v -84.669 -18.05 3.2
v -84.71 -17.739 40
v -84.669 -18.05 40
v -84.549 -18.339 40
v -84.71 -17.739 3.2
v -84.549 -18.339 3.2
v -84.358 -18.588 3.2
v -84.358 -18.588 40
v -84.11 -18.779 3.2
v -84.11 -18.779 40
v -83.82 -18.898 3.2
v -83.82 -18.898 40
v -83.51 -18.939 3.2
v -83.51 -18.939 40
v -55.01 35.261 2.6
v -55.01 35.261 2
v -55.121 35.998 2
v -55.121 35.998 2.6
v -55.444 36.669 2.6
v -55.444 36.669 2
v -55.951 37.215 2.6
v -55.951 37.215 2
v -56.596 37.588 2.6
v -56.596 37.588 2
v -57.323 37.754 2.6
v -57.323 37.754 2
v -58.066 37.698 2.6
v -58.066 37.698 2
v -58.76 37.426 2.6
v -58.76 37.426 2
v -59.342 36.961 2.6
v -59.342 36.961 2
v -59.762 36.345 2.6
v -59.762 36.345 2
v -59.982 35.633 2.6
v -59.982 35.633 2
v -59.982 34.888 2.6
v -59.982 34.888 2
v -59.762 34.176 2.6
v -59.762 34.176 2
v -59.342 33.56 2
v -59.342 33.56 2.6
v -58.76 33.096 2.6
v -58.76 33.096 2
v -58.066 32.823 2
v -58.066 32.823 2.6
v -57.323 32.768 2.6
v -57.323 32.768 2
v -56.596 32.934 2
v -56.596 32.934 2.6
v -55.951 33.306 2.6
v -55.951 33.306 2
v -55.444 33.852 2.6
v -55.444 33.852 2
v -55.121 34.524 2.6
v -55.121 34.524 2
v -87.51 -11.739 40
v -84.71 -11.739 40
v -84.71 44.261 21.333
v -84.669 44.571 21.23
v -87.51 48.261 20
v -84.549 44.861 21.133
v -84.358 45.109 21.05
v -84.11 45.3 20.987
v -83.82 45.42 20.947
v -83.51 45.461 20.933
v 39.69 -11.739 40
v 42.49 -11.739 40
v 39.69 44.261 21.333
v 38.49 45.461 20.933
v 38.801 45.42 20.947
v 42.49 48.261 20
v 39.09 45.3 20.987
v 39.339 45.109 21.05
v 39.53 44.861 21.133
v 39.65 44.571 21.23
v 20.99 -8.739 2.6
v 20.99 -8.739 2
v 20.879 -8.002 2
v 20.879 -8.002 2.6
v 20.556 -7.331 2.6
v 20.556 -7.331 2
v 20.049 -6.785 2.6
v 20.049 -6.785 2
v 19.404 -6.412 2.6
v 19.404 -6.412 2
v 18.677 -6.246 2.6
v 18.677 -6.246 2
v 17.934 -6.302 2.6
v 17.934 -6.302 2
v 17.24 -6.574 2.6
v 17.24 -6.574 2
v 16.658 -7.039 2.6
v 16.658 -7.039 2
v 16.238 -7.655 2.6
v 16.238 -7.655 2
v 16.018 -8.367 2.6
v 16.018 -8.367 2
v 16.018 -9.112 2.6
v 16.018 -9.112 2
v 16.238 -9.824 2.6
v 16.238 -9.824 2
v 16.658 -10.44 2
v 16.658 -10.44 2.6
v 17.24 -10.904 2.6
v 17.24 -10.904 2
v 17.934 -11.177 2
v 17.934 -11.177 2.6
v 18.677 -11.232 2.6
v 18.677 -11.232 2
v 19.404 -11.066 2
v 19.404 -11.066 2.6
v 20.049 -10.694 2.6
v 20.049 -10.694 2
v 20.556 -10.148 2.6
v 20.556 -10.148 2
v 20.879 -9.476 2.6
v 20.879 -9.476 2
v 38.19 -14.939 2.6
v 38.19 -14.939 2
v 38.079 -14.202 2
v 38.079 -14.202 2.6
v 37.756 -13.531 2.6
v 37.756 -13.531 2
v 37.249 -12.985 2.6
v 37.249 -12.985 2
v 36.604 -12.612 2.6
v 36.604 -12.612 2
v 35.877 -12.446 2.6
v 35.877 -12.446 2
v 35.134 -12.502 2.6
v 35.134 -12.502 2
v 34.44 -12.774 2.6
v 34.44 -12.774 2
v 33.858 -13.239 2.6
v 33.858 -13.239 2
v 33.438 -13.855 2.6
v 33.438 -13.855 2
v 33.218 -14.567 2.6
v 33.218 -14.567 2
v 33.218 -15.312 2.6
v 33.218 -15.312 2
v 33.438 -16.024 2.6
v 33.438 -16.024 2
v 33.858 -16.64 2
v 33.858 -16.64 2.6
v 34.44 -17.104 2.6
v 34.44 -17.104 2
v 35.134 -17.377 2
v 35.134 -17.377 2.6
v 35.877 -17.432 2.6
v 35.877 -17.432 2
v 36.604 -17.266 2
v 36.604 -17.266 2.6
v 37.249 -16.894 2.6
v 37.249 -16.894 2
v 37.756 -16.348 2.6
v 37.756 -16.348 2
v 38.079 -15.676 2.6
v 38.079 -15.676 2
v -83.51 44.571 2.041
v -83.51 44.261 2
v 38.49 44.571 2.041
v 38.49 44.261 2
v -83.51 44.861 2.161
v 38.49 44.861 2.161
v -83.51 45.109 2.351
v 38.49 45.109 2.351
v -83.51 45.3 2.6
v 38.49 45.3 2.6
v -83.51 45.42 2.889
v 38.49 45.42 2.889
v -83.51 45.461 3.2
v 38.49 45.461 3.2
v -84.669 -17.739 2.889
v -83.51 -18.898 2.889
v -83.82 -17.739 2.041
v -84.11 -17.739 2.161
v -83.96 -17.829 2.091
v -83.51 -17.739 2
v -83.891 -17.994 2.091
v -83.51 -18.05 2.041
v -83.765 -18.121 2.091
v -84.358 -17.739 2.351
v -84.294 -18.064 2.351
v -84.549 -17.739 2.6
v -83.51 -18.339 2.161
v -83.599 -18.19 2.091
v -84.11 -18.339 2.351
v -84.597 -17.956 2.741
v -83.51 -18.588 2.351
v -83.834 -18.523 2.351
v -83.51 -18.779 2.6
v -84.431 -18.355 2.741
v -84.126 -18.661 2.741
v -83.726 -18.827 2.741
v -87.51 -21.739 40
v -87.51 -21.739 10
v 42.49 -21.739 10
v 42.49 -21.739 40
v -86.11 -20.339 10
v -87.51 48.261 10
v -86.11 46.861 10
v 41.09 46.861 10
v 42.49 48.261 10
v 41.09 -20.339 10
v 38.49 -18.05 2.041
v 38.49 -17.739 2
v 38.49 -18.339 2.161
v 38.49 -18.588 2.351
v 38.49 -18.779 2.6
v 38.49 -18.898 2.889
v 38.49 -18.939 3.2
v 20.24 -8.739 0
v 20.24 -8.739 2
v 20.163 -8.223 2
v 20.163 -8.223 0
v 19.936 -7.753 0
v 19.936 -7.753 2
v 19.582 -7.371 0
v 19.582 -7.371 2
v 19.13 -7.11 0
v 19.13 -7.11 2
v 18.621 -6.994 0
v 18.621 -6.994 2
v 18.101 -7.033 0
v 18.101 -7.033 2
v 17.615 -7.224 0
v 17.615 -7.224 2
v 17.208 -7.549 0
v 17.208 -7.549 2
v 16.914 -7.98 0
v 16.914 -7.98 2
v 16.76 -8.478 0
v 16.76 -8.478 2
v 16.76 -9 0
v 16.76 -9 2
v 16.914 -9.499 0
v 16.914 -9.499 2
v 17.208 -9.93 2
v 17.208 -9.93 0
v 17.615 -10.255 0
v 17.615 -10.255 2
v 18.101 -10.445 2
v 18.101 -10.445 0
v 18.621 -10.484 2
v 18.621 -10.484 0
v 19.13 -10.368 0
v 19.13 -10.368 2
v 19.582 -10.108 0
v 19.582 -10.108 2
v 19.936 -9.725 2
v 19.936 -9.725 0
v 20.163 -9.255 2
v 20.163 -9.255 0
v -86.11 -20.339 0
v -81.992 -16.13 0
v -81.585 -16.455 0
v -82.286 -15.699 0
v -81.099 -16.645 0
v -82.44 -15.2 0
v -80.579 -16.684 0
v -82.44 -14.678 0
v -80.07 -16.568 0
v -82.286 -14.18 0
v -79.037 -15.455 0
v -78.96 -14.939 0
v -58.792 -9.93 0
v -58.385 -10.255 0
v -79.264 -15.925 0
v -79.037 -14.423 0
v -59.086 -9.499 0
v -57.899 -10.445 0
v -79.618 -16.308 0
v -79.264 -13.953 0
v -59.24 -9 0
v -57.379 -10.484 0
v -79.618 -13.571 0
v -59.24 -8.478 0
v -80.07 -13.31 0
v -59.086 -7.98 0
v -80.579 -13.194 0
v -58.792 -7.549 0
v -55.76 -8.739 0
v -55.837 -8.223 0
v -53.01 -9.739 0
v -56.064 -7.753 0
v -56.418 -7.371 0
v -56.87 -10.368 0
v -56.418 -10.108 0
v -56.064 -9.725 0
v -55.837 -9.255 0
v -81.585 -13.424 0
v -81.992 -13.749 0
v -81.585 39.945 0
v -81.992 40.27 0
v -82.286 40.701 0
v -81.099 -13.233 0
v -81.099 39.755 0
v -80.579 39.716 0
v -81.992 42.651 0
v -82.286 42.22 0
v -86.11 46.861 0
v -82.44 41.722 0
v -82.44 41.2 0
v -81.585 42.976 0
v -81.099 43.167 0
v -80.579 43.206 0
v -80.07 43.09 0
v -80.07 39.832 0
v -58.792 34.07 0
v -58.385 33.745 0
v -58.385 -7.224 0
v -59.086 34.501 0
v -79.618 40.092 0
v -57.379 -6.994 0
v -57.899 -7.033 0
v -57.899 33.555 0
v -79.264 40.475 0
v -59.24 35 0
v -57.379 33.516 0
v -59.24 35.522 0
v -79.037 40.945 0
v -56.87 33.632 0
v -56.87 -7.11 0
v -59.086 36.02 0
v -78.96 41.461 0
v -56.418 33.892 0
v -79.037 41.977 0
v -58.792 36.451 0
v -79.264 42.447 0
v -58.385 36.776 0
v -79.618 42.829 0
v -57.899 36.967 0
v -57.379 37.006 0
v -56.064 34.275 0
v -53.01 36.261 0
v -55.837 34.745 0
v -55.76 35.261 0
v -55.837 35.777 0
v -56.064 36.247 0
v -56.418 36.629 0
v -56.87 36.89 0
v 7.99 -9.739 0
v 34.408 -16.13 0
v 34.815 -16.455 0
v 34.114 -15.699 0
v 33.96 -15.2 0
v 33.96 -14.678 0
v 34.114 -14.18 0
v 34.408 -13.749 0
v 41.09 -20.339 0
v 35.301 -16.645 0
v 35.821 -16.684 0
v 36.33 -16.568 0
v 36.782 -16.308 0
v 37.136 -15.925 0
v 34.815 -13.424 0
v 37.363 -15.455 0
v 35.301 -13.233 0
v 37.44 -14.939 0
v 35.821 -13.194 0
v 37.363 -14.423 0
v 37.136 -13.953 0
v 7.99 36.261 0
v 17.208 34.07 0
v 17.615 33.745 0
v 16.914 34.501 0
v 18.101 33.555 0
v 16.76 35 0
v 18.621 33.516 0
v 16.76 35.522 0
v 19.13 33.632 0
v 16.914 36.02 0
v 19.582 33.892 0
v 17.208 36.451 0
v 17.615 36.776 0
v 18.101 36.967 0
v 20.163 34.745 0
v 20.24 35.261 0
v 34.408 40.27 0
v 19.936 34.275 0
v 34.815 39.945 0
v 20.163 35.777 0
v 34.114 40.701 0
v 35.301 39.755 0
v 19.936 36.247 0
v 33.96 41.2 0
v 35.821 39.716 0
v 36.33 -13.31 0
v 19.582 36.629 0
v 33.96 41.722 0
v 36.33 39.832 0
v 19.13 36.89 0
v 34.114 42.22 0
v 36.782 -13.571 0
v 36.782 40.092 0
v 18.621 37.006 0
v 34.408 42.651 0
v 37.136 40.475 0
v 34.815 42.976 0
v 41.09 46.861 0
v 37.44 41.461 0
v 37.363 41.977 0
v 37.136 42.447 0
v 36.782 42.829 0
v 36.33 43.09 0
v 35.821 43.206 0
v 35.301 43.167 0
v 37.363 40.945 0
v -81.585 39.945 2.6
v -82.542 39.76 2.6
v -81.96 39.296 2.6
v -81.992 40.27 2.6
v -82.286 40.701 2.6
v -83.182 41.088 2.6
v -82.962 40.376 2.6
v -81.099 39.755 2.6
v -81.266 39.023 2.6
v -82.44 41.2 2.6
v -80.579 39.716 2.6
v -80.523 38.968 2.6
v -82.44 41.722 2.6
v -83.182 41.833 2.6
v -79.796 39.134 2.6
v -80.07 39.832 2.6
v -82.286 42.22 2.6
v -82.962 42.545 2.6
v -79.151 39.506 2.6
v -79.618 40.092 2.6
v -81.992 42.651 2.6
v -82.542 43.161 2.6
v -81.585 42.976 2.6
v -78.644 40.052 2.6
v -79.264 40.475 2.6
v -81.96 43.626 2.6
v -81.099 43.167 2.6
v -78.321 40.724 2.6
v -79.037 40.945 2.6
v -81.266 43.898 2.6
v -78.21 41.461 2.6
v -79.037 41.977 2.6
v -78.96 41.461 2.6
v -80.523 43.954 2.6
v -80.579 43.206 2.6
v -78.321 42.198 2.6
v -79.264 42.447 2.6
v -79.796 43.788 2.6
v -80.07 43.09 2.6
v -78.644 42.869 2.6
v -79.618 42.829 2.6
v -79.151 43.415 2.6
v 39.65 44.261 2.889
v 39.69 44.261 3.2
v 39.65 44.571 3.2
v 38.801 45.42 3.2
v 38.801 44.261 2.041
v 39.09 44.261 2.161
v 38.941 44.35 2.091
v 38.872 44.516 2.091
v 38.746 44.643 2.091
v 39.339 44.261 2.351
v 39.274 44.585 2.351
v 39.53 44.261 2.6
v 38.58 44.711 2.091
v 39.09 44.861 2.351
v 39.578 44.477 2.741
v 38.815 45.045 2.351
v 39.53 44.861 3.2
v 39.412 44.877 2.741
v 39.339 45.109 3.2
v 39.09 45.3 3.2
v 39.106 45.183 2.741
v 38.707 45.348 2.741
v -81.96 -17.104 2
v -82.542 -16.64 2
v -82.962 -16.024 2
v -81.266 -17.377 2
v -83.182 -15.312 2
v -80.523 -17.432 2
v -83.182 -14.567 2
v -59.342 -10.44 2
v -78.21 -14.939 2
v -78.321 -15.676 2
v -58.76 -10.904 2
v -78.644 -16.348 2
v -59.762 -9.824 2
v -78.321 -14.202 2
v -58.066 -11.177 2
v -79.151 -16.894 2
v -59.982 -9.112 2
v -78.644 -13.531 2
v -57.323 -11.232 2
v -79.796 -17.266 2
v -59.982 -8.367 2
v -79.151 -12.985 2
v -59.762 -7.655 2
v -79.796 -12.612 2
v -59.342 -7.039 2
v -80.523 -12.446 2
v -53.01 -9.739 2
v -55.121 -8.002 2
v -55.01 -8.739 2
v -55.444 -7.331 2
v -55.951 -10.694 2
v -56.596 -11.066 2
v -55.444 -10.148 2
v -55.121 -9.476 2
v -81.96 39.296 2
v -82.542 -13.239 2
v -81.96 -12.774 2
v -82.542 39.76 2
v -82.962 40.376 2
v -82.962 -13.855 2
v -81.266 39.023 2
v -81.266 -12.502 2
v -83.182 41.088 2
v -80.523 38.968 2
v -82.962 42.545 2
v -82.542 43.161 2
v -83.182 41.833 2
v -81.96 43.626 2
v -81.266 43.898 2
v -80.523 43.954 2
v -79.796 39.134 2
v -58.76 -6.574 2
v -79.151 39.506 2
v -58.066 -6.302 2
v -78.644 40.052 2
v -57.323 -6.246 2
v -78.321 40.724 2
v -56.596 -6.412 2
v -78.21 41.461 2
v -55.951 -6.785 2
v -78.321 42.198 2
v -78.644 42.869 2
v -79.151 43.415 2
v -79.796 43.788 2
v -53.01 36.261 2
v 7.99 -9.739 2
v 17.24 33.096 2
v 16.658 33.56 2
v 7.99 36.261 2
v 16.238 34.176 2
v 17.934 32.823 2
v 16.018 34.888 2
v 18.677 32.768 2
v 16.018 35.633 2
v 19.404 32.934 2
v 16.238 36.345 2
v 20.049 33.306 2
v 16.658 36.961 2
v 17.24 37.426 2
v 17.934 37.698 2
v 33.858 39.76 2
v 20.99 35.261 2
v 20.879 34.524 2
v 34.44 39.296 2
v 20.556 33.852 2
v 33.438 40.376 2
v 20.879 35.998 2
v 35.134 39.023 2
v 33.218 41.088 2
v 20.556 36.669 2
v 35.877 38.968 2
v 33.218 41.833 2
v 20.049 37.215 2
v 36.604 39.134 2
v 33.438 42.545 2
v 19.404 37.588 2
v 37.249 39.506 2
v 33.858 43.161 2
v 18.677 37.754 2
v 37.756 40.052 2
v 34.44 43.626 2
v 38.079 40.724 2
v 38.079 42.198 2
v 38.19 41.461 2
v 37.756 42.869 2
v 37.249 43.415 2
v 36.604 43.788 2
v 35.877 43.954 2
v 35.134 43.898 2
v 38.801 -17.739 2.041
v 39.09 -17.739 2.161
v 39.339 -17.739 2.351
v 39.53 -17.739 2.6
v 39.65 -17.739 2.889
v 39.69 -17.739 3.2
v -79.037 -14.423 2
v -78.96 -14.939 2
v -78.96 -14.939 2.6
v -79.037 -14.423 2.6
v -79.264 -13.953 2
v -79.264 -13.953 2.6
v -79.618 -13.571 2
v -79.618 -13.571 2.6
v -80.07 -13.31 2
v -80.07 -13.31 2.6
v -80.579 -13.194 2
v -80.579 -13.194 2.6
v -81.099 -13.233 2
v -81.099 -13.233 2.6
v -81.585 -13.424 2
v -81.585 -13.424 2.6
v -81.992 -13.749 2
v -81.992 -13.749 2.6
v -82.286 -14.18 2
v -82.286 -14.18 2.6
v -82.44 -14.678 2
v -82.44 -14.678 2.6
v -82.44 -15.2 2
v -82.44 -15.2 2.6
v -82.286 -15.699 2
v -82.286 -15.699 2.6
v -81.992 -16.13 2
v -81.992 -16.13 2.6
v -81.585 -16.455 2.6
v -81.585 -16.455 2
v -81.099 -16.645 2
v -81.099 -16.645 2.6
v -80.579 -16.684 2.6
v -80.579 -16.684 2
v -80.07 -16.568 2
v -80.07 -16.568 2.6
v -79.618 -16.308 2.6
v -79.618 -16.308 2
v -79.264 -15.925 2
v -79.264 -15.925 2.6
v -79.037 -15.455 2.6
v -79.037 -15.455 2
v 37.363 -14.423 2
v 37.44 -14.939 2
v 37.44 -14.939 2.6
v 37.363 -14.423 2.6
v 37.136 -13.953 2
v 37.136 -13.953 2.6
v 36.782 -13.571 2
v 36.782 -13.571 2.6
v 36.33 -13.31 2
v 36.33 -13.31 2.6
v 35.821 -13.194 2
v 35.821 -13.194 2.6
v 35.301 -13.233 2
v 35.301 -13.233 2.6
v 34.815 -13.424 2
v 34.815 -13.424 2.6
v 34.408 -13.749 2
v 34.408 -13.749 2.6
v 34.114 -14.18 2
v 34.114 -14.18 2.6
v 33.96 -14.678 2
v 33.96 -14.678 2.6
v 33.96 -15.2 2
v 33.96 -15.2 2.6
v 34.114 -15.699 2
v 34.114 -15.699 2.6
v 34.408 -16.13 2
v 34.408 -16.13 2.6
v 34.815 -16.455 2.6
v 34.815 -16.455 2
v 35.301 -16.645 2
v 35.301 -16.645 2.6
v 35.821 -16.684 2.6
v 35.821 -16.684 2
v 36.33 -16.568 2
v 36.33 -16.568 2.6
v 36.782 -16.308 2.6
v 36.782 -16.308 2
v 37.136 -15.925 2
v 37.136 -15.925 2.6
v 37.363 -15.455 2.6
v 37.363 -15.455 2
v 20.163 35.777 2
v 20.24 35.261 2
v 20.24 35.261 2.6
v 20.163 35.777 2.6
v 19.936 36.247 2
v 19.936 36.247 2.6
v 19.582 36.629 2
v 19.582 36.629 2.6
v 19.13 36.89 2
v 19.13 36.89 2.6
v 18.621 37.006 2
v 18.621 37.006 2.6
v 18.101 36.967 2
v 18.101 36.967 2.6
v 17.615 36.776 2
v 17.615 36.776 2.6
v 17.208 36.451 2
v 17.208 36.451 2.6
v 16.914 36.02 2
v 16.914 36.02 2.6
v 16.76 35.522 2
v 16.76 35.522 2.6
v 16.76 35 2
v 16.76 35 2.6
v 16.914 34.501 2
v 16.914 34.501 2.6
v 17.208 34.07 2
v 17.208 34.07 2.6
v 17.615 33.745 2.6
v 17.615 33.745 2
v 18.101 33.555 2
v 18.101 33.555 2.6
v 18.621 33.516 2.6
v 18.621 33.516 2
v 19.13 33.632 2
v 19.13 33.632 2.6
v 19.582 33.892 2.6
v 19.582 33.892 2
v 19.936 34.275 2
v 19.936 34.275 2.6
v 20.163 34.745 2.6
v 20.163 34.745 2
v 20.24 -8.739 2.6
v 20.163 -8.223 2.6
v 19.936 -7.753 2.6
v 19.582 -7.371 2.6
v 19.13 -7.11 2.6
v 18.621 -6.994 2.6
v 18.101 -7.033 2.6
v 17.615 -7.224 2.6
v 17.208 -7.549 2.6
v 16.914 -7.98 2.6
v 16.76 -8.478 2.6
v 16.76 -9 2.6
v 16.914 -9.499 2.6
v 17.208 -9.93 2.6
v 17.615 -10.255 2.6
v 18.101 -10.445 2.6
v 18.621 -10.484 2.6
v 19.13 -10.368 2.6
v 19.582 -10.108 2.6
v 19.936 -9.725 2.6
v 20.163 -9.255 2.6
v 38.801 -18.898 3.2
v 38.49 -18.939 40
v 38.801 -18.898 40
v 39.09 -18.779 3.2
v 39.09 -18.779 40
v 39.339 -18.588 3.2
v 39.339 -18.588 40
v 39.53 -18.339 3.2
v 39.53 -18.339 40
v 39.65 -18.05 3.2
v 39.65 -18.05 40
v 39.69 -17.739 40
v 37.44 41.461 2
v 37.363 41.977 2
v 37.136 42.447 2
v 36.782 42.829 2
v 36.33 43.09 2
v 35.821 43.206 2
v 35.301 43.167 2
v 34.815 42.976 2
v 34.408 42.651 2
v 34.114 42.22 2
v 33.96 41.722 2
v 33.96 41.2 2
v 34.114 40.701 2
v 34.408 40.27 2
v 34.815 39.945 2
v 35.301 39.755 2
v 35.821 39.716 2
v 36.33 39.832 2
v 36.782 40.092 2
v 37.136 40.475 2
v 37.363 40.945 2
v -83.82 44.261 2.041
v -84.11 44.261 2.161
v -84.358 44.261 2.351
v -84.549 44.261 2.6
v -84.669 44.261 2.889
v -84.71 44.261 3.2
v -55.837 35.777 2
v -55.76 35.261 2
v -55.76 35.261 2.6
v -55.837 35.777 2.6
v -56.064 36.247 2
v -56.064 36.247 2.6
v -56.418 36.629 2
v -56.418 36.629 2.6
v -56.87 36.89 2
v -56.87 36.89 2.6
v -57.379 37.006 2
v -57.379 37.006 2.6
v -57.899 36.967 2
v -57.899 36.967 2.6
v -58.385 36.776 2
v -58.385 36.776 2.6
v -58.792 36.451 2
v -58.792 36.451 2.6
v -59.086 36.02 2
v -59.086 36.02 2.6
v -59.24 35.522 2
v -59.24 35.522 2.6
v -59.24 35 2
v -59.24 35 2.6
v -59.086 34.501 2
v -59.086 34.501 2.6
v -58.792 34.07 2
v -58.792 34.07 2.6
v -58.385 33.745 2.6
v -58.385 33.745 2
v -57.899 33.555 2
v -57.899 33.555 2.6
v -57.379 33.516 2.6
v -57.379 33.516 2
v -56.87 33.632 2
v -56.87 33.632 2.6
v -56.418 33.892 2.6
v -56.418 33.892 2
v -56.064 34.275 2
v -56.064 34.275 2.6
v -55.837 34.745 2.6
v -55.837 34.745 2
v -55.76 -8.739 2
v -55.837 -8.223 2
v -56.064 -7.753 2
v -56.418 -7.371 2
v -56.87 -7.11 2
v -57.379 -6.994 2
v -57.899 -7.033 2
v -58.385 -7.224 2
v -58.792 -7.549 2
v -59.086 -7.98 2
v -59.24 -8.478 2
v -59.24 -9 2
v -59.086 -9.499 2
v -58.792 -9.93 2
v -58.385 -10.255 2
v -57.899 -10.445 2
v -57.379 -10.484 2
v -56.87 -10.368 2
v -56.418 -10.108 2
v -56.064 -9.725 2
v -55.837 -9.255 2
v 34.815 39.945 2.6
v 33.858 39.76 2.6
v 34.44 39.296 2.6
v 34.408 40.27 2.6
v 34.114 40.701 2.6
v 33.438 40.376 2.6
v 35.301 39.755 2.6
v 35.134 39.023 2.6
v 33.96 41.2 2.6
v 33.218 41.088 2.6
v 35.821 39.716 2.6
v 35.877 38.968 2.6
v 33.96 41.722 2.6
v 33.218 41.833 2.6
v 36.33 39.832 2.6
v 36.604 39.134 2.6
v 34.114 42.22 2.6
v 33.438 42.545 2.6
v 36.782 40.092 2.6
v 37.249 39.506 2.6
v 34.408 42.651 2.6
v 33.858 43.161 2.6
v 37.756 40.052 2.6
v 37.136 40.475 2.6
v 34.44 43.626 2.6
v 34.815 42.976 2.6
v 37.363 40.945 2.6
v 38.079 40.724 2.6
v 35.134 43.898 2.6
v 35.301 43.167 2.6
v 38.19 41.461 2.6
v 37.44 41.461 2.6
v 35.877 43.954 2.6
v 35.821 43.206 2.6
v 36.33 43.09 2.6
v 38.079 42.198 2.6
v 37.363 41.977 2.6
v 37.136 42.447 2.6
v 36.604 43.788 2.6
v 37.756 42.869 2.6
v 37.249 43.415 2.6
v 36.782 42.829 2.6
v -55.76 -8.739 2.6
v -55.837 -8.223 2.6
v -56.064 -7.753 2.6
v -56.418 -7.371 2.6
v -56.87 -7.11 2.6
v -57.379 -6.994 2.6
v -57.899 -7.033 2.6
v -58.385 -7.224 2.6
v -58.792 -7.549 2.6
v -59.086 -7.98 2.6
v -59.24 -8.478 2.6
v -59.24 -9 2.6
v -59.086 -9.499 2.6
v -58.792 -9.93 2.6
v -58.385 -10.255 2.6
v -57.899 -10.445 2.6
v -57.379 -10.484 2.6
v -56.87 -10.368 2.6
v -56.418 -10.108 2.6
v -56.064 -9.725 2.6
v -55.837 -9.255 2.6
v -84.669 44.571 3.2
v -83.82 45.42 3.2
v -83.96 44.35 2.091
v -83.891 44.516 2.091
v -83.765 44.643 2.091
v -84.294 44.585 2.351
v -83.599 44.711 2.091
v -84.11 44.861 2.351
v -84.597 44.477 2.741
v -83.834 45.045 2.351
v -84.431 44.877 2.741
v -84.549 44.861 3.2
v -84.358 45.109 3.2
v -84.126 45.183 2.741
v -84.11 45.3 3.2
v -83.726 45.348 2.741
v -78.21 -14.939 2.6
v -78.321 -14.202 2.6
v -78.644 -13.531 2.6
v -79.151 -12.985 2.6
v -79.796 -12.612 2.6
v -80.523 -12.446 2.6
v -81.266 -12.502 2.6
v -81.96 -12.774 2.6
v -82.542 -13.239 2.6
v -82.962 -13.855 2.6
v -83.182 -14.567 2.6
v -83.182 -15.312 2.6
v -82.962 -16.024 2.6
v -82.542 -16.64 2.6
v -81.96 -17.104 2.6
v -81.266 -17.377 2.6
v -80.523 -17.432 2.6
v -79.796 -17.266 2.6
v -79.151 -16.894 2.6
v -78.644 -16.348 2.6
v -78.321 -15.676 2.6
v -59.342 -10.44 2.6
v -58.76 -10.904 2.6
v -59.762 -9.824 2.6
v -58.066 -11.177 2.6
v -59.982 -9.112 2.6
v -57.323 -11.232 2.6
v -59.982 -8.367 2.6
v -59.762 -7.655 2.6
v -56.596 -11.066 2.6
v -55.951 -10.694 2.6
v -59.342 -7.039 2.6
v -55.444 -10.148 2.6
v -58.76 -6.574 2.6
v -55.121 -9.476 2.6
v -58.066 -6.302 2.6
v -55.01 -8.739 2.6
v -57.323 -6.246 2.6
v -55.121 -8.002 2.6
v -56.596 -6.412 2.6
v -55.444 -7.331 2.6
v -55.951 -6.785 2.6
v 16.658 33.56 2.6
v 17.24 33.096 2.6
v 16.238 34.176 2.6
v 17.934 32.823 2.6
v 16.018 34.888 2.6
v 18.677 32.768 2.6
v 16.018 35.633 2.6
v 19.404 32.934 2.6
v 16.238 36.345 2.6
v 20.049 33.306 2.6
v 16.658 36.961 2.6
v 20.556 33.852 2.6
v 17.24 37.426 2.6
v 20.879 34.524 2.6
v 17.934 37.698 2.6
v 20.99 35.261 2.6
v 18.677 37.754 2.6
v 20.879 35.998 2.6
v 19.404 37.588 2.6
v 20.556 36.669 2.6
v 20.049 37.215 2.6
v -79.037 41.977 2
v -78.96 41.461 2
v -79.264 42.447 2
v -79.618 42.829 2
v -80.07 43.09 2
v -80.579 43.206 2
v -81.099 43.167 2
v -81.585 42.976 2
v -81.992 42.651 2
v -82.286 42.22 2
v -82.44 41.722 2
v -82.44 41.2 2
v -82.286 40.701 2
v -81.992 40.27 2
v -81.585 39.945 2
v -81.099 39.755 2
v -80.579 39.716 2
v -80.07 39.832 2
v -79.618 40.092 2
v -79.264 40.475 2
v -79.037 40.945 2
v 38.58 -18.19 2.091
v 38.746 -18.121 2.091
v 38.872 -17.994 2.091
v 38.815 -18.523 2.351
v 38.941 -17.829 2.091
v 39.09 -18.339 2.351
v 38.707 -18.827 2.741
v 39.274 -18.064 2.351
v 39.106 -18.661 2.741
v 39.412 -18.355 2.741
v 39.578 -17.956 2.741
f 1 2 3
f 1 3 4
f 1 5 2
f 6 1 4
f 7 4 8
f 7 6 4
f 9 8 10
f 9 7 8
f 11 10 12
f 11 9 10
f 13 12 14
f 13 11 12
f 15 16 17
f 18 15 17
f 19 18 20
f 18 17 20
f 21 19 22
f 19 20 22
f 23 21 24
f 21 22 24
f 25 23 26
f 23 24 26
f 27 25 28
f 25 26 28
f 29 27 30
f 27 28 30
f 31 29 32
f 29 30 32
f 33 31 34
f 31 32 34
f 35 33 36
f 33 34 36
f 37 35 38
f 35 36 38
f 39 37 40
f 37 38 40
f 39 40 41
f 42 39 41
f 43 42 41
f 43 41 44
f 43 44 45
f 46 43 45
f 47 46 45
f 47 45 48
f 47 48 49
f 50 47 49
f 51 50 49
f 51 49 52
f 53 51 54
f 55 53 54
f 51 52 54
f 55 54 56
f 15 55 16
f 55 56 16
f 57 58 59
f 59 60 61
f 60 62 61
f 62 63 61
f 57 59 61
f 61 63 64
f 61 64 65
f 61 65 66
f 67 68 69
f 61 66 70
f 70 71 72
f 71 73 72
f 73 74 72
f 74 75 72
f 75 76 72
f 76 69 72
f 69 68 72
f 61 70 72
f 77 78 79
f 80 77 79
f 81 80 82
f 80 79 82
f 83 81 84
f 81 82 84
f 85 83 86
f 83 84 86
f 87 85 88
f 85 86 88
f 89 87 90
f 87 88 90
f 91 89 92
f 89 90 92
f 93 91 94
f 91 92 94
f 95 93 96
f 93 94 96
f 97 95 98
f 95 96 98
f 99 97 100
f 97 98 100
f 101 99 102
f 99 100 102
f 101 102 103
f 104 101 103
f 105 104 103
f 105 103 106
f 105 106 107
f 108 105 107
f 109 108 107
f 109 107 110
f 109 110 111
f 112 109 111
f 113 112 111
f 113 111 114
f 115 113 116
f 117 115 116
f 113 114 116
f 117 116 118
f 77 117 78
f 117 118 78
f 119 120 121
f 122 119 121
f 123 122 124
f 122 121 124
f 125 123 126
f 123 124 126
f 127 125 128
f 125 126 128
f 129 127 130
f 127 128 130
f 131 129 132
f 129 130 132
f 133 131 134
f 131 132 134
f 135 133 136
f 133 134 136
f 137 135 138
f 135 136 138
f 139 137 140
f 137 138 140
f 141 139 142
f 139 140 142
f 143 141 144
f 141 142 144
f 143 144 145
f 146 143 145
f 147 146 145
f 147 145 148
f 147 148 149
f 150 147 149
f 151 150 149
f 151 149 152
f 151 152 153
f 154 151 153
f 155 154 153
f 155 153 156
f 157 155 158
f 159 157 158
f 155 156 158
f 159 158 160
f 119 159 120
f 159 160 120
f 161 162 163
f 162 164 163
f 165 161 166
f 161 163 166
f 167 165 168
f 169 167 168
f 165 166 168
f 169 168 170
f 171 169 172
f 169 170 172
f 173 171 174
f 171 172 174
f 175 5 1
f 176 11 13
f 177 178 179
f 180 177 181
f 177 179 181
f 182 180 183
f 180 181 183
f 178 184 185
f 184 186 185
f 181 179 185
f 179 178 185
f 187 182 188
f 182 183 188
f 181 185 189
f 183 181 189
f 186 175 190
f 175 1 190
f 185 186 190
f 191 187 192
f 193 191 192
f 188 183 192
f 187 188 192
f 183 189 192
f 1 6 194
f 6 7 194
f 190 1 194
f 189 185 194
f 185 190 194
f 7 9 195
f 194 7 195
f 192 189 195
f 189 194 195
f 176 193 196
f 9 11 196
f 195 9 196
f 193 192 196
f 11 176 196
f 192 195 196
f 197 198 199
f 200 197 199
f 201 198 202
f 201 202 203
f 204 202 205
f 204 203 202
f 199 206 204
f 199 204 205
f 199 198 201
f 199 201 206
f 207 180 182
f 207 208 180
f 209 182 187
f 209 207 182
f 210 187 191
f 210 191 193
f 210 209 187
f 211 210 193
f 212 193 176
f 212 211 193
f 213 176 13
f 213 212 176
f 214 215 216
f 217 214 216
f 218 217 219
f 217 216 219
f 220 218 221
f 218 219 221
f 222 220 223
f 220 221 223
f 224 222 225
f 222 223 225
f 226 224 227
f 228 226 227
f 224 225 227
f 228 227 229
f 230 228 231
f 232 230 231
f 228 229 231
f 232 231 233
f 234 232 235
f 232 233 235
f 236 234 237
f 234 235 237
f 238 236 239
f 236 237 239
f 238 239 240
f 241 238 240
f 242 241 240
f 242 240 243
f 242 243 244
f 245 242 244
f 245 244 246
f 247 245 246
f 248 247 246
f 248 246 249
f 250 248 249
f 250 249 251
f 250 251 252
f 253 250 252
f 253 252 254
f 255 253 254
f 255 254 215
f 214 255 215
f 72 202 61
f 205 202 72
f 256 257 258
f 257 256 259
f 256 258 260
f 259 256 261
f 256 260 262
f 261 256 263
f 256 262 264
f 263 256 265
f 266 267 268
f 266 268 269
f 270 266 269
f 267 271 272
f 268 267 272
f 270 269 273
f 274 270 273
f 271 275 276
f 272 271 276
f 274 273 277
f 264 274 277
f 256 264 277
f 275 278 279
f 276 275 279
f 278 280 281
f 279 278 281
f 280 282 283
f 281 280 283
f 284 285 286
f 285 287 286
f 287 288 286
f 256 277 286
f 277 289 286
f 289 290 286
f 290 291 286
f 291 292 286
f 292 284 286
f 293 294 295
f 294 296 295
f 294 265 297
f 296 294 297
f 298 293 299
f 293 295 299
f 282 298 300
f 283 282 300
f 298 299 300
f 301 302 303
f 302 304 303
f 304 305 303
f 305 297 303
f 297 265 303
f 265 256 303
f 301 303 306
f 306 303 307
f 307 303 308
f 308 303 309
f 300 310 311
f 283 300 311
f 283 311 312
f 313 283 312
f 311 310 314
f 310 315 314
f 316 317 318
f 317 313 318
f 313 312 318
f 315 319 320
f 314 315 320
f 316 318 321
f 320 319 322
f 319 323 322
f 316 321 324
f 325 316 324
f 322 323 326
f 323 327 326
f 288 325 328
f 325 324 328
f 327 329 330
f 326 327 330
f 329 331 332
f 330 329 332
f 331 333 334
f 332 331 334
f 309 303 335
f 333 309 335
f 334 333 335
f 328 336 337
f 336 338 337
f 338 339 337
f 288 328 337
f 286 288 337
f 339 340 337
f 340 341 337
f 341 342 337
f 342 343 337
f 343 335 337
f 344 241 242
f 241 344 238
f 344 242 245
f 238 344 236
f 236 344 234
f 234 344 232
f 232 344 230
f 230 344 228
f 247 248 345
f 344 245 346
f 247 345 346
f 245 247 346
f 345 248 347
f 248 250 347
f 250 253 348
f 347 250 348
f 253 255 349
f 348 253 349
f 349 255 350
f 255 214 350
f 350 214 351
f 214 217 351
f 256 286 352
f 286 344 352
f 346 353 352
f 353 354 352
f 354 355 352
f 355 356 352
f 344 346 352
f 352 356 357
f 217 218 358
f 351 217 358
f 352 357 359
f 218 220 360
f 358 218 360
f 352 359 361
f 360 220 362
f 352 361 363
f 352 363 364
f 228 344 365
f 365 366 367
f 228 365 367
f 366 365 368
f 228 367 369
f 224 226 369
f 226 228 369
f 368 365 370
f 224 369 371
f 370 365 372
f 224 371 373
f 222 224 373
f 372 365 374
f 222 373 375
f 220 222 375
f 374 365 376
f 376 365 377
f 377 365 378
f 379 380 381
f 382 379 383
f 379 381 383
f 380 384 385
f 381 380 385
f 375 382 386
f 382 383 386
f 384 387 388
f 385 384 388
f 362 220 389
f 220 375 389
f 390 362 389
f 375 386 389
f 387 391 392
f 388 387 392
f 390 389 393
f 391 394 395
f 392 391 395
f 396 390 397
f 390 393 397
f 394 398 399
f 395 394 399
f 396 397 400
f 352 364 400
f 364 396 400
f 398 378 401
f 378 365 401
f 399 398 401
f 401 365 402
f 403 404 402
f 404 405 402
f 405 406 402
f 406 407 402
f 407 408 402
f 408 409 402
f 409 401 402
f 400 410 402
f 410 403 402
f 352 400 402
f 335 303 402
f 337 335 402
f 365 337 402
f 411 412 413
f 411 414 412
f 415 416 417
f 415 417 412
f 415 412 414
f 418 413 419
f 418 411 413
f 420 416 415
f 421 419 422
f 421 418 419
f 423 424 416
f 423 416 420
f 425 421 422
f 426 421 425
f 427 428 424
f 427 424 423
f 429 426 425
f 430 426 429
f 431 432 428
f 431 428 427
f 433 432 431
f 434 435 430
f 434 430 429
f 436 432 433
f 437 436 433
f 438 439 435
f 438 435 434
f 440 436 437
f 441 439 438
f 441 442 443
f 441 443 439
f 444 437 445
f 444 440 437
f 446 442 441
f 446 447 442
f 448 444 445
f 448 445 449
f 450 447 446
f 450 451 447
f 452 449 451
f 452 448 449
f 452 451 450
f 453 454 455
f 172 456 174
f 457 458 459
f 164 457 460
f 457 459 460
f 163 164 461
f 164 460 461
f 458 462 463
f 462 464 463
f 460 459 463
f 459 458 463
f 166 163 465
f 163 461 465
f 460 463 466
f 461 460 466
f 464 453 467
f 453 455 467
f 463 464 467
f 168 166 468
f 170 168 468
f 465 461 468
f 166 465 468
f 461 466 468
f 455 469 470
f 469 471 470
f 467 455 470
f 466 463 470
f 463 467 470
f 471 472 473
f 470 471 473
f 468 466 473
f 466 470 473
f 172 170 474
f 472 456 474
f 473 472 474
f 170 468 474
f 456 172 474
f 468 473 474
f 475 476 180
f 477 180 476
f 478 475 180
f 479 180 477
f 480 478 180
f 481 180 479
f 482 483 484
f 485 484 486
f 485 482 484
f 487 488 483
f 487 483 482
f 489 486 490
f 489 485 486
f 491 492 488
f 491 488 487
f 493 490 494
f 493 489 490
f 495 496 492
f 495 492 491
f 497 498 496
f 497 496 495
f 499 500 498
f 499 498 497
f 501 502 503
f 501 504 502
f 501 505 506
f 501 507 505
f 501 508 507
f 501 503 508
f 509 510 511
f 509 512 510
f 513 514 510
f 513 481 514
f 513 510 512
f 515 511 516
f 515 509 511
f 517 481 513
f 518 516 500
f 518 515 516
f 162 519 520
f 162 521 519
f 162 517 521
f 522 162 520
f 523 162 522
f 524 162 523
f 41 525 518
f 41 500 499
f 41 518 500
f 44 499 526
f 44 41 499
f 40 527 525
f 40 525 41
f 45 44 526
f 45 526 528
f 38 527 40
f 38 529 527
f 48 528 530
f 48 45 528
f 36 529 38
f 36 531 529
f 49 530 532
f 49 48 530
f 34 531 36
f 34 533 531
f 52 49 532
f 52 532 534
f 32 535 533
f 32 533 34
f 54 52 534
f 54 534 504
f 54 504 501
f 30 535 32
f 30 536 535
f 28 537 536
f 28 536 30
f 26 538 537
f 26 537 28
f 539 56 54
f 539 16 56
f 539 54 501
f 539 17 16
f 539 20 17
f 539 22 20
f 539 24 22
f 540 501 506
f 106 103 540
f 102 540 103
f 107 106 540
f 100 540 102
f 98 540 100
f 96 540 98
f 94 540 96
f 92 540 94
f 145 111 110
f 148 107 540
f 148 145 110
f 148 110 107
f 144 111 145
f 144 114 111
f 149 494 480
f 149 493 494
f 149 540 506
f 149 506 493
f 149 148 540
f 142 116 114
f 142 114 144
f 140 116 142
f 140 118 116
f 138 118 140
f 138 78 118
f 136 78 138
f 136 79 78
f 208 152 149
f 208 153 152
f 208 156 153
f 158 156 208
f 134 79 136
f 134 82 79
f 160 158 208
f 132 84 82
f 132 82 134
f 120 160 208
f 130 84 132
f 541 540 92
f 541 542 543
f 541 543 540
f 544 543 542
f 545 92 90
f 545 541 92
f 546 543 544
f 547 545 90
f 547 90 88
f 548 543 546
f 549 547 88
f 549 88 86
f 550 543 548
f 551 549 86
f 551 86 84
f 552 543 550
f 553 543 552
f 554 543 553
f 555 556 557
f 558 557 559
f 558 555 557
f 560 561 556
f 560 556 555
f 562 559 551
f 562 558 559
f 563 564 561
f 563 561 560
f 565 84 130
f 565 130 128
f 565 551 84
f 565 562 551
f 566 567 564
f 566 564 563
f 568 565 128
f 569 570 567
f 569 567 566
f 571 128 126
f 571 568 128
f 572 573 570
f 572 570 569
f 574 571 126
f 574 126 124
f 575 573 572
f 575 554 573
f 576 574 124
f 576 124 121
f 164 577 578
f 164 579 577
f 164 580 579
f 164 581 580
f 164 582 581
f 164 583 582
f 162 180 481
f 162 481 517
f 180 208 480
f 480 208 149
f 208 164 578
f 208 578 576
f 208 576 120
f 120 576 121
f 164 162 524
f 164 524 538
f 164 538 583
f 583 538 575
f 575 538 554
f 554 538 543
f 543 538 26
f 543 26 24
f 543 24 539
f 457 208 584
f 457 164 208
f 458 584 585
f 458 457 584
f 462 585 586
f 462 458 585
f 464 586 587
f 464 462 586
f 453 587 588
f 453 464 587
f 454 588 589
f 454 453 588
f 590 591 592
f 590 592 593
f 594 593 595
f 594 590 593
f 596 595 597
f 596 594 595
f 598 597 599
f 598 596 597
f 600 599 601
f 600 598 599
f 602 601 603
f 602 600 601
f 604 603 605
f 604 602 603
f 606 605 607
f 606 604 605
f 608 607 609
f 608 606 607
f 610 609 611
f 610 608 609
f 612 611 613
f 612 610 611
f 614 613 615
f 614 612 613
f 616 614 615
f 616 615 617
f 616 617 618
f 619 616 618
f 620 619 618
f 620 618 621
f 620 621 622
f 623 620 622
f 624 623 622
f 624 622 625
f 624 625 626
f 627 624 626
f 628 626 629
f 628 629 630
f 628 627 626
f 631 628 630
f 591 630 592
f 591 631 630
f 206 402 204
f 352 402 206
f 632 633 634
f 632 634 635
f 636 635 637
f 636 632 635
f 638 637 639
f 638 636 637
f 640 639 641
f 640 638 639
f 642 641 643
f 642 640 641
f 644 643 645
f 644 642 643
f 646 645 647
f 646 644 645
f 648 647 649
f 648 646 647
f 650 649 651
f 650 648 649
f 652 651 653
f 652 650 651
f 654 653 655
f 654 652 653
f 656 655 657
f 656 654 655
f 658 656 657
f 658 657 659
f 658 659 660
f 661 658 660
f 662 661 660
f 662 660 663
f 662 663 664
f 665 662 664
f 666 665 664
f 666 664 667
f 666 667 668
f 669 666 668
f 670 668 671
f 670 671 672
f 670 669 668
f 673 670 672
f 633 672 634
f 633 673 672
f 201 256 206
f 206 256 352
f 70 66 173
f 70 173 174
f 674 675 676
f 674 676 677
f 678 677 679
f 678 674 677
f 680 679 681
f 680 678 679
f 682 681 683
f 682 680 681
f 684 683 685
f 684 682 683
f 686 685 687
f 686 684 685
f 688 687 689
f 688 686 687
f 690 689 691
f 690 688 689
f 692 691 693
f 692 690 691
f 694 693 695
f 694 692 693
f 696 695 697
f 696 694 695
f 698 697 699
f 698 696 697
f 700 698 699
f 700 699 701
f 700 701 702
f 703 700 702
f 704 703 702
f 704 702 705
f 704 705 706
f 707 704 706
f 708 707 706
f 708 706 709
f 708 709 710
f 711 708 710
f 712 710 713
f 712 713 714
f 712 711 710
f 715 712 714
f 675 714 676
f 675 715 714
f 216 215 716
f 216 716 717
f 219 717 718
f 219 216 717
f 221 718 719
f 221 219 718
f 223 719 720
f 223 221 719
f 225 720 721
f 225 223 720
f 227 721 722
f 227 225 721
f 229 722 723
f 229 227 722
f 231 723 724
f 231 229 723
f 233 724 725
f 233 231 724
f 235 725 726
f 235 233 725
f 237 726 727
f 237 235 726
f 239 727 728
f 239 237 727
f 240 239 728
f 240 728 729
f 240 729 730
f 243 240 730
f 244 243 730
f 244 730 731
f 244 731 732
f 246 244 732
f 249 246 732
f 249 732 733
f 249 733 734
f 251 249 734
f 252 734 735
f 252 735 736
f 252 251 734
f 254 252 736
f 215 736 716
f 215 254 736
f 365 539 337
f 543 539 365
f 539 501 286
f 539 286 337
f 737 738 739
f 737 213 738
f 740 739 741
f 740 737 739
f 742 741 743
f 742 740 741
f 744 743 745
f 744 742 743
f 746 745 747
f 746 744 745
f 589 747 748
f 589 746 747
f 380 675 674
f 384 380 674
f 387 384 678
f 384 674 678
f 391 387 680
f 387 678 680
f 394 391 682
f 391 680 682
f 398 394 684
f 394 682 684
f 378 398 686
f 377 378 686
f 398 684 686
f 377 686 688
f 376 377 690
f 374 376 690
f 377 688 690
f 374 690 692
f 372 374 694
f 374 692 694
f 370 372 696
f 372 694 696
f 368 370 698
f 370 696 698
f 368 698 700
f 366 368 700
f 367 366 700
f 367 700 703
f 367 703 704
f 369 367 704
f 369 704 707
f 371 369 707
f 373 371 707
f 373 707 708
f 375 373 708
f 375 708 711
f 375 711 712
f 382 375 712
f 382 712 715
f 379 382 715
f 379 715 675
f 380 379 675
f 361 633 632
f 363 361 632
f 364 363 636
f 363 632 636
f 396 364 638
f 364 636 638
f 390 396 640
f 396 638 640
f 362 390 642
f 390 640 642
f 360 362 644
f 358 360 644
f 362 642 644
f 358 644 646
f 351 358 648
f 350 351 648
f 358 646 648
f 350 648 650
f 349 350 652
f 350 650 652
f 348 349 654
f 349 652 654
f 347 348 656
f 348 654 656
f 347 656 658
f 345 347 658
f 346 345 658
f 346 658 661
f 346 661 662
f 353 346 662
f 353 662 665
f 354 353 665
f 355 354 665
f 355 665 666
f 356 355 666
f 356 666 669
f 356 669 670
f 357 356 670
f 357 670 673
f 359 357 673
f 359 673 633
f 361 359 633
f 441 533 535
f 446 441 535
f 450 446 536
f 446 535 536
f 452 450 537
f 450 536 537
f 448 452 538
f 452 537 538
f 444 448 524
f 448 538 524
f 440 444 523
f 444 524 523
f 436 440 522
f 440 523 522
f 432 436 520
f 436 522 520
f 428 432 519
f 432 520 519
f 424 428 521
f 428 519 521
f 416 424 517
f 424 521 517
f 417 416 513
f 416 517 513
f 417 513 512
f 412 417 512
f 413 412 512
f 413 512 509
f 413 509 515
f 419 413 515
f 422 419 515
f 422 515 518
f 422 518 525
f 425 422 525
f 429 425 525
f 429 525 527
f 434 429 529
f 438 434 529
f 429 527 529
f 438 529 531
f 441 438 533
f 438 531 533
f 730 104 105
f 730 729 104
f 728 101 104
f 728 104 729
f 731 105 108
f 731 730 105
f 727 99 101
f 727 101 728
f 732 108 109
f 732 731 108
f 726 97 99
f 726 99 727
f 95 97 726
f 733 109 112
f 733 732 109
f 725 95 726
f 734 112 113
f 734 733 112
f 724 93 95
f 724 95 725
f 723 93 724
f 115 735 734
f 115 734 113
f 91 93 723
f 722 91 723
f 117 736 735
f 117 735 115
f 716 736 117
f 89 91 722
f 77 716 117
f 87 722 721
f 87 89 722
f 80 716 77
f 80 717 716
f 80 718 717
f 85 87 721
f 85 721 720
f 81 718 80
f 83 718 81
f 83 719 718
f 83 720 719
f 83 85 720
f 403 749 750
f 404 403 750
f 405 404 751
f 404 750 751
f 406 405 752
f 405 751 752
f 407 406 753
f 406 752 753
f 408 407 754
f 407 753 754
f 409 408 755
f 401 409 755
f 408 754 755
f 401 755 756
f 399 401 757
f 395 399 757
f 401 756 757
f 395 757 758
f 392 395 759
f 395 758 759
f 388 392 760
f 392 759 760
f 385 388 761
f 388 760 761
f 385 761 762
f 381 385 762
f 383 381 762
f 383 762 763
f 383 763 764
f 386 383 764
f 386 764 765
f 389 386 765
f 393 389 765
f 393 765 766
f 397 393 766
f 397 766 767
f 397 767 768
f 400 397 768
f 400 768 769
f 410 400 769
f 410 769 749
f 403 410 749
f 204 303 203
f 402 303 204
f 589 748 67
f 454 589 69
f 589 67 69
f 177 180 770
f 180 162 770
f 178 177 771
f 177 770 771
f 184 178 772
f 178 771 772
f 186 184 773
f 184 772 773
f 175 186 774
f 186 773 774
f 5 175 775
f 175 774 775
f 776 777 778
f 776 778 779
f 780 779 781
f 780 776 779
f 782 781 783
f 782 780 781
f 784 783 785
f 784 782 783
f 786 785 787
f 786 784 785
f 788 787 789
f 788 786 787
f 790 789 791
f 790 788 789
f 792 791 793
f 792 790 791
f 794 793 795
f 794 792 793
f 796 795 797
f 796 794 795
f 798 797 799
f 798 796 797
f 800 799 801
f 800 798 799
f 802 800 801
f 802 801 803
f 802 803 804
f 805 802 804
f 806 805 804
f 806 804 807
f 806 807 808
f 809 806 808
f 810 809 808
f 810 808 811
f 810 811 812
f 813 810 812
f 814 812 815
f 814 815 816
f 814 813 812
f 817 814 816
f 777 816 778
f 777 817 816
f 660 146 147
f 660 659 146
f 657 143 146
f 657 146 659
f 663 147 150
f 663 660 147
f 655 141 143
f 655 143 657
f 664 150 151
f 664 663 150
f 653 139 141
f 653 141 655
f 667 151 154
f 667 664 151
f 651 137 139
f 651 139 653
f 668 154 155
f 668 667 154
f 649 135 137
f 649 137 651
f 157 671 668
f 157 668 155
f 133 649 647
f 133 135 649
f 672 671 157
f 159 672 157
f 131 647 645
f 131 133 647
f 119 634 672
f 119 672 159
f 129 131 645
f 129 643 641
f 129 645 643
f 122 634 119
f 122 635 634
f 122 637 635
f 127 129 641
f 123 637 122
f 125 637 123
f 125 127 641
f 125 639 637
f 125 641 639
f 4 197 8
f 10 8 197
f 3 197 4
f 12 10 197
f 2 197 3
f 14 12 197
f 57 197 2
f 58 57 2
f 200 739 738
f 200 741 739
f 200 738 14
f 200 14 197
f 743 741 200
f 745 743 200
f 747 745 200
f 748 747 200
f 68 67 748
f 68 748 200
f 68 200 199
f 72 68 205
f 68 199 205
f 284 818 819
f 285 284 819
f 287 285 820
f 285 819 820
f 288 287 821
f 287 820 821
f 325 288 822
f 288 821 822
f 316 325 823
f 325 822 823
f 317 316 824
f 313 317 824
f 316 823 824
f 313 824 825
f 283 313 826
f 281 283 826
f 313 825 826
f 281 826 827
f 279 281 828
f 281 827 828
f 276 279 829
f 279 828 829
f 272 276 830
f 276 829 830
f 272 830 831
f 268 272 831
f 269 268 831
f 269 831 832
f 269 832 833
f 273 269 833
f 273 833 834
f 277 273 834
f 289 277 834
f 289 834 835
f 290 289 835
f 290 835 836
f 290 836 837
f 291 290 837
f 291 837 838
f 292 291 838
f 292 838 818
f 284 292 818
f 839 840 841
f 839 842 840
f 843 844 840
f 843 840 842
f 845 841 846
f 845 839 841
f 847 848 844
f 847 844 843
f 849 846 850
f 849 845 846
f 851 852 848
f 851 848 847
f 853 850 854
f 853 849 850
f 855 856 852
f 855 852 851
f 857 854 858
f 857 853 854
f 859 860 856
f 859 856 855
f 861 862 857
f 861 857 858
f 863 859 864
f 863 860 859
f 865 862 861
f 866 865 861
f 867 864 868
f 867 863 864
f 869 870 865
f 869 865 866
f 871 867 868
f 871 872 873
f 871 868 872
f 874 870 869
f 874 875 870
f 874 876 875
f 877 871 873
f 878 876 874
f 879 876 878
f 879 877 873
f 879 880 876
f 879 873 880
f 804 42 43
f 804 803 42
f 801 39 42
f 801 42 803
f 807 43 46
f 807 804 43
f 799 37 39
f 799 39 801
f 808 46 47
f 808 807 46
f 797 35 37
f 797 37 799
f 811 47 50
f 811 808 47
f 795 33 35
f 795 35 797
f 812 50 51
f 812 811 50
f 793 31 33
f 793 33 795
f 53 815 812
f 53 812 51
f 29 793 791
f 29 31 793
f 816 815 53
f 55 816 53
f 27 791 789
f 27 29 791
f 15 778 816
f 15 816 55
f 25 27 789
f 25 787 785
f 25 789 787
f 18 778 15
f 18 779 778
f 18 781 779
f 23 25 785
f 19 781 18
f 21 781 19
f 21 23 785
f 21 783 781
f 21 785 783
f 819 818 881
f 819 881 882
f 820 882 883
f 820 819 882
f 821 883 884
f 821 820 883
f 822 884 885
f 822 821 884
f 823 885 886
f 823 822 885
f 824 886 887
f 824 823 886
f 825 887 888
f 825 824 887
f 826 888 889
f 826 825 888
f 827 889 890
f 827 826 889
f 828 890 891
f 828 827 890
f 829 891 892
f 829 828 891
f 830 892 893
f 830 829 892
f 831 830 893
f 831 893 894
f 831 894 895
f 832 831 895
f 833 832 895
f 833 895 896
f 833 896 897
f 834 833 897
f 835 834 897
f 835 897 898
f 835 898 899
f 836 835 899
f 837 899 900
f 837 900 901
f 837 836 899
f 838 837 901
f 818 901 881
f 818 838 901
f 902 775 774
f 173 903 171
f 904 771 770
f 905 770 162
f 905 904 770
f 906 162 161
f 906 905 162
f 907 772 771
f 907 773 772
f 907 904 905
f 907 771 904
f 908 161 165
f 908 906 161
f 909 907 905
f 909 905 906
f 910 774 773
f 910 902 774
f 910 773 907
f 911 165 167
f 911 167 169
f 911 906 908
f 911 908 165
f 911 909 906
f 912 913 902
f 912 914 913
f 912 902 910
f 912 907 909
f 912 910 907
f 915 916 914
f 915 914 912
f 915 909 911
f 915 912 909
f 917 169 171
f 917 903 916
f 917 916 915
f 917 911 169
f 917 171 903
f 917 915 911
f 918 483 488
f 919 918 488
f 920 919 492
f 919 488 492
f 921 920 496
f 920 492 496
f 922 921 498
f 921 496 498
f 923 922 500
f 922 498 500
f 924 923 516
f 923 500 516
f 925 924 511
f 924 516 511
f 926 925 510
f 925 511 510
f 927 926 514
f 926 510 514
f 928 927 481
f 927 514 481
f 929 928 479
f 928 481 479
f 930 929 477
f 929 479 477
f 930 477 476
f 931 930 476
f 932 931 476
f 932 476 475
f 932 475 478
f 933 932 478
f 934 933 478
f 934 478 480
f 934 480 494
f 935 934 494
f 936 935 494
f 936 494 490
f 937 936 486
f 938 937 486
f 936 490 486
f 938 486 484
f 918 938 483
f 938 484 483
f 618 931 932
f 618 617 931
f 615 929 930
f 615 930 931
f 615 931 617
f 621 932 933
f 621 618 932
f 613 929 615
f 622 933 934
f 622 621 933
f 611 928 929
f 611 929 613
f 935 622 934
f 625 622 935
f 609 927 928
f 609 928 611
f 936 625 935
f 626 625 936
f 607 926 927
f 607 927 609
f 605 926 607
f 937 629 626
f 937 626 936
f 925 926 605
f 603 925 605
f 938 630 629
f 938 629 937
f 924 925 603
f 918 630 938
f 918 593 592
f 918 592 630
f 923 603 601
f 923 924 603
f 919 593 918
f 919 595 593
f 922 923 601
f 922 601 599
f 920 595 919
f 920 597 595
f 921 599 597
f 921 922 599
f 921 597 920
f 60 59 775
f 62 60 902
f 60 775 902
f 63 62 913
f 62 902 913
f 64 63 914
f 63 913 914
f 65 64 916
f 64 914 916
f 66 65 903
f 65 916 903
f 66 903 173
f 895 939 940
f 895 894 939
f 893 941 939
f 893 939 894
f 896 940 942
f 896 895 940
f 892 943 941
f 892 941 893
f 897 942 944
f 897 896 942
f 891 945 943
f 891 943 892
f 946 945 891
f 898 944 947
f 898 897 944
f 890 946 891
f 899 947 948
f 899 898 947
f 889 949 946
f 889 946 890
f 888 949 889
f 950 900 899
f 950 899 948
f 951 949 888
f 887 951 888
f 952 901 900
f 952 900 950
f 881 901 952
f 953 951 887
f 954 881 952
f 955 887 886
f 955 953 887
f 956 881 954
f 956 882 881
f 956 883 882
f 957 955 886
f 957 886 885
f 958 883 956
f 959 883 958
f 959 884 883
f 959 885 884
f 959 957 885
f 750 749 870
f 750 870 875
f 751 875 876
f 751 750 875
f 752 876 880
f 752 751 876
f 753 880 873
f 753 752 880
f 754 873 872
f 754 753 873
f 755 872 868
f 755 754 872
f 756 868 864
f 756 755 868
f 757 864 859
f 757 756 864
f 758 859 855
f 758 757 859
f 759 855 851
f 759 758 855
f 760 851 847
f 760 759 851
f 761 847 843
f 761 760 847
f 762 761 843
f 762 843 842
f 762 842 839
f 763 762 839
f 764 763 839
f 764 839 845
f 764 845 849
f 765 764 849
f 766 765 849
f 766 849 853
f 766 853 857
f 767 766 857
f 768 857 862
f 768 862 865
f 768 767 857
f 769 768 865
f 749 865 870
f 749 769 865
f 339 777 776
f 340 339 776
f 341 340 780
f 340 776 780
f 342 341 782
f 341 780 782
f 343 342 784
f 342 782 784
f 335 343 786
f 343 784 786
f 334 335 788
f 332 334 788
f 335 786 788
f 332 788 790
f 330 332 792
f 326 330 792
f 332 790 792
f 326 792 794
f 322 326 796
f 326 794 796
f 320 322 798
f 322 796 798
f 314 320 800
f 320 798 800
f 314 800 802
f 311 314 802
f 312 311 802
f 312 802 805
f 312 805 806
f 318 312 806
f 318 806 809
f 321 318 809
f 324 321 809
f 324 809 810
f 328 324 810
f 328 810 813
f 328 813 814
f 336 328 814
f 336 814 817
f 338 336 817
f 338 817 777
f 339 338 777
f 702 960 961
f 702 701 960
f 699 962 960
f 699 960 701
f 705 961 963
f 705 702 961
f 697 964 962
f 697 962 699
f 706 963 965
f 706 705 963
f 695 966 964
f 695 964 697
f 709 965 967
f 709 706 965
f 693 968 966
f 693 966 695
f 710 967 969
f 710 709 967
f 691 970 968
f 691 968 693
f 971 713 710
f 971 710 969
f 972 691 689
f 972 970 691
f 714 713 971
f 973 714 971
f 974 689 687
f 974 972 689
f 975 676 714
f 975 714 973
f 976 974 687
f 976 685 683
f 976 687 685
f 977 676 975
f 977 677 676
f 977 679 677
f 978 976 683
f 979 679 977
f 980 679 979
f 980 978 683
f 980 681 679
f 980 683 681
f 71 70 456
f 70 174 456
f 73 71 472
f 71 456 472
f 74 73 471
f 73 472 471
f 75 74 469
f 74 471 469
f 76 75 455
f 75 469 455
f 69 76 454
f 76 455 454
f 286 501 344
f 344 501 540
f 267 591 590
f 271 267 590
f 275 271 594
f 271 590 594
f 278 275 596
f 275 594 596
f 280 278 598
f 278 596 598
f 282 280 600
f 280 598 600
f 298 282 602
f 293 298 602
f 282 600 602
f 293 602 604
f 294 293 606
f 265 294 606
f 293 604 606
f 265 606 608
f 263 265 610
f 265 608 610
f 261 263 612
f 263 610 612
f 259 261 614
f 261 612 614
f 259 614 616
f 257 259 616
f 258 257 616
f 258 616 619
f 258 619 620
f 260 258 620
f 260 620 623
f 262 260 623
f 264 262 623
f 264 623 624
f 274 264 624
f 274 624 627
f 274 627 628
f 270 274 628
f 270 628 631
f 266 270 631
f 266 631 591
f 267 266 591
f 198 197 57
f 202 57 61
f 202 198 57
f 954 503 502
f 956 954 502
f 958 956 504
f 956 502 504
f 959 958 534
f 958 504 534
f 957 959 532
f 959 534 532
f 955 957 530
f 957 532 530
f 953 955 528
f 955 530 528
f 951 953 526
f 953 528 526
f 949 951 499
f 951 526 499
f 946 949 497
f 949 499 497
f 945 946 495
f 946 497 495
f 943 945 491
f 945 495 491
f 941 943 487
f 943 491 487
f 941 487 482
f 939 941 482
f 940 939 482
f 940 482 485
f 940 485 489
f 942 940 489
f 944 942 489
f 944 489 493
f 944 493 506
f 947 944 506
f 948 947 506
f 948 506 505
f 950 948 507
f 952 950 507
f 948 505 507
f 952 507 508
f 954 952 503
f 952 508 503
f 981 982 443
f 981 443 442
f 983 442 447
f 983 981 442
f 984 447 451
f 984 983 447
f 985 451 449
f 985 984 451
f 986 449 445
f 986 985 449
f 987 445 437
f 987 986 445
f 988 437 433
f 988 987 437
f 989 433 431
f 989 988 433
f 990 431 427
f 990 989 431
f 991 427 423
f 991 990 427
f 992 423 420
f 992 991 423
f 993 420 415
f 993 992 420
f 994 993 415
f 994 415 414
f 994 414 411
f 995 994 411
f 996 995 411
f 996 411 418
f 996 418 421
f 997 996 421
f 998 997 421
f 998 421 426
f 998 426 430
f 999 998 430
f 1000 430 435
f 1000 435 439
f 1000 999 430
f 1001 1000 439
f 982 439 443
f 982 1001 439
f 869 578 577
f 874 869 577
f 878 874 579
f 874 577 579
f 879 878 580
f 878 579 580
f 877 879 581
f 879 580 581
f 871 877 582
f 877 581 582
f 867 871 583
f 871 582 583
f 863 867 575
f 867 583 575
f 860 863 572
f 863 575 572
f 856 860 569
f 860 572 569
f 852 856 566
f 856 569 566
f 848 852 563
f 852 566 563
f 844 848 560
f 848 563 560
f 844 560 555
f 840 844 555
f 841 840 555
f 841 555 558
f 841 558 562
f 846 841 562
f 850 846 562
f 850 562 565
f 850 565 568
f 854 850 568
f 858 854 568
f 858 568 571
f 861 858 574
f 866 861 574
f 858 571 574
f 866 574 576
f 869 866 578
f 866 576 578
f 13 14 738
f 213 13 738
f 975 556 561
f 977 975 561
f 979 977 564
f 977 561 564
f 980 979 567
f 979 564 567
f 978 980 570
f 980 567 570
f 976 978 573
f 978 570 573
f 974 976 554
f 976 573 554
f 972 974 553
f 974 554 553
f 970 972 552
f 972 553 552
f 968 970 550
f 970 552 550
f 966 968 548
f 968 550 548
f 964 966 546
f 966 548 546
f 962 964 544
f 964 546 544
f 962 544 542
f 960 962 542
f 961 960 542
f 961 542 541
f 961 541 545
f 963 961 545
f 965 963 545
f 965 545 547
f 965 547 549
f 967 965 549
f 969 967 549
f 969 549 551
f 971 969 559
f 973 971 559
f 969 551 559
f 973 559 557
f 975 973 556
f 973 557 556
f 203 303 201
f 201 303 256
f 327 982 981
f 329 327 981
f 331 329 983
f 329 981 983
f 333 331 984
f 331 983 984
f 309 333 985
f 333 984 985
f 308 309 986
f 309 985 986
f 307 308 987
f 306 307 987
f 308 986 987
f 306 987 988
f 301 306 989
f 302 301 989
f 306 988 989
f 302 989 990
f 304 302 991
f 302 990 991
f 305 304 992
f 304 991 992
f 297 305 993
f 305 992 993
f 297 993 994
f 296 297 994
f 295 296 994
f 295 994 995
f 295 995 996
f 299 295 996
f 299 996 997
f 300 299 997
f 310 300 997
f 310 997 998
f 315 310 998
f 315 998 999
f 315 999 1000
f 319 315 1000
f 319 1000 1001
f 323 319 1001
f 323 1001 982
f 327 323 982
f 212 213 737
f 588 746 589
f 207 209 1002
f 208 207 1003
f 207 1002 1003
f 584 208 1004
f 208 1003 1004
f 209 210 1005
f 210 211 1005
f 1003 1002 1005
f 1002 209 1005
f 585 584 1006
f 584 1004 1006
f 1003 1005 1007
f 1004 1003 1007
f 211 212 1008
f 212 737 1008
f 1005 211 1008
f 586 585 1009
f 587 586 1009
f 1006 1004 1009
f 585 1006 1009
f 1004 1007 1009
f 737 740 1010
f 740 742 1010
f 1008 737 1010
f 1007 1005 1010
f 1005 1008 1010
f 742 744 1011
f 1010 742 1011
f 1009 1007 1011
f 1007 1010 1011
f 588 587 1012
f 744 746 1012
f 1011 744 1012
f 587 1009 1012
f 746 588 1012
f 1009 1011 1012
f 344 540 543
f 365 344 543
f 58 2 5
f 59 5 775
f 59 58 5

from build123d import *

# Parameters (mm, degrees)
F0_W          = 130
F0_H          = 70
F1_DEPTH      = 40
F2_W          = 124.4
F2_H          = 64.4
F3_DEPTH      = 38
F5_DEPTH      = 146.2
F6_W          = 130
F6_H          = 70
F6_W_2        = 127.2
F6_H_2        = 67.2
F7_DEPTH      = 10
F8_W          = 61
F8_H          = 46
F8_R          = 1.75
F9_DEPTH      = 25
F9_DEPTH_BACK = 25
F10_R         = 1.75
F11_DEPTH     = 25
F12_R         = 2.5
F12_R_2       = 1.75
F13_DEPTH     = 0.6
F14_R         = 1.2


with BuildPart() as f1:
    # F0 (on Top) → F1 (new body)
    with BuildSketch(Plane.XY):
        with Locations((-22.509574, 13.26069)):
            Rectangle(F0_W, F0_H)
    extrude(amount=F1_DEPTH)

    # F2 (on face) → F3 (cut)
    with BuildSketch(Plane.XY.offset(40)):
        with Locations((-22.509574, 13.26069)):
            Rectangle(F2_W, F2_H)
    extrude(amount=-F3_DEPTH, mode=Mode.SUBTRACT)

    # F4 (on face) → F5 (cut)
    with BuildSketch(Plane.YZ.offset(42.490426)):
        Polygon((48.26069, 40), (-11.73931, 40), (48.26069, 20), align=None)
    extrude(amount=-F5_DEPTH, mode=Mode.SUBTRACT)

    # F6 (on face) → F7 (cut)
    with BuildSketch(Plane(origin=(0, 0, 0), x_dir=(1, 0, 0), z_dir=(0, 0, -1))):
        with Locations((-22.509574, -13.26069)):
            Rectangle(F6_W, F6_H)
        with Locations((-22.509574, -13.26069)):
            Rectangle(F6_W_2, F6_H_2, mode=Mode.SUBTRACT)
    extrude(amount=-F7_DEPTH, mode=Mode.SUBTRACT)

    # F8 (on face) → F9 (cut, two sides)
    with BuildSketch(Plane.XY.offset(2)) as f9_sk:
        with Locations((-22.509574, 13.26069)):
            Rectangle(F8_W, F8_H)
        with Locations((-57.509574, 35.26069)):
            Circle(F8_R)
        with Locations((18.490426, 35.26069)):
            Circle(F8_R)
        with Locations((18.490426, -8.73931)):
            Circle(F8_R)
        with Locations((-57.509574, -8.73931)):
            Circle(F8_R)
    extrude(amount=-F9_DEPTH, mode=Mode.SUBTRACT)
    extrude(f9_sk.sketch, amount=-F9_DEPTH_BACK, mode=Mode.SUBTRACT)

    # F10 (on face) → F11 (cut)
    with BuildSketch(Plane.XY.offset(2)):
        with Locations((-80.709574, 41.46069)):
            Circle(F10_R)
        with Locations((35.690426, 41.46069)):
            Circle(F10_R)
        with Locations((35.690426, -14.93931)):
            Circle(F10_R)
        with Locations((-80.709574, -14.93931)):
            Circle(F10_R)
    extrude(amount=-F11_DEPTH, mode=Mode.SUBTRACT)

    # F12 (on face) → F13 (join)
    with BuildSketch(Plane.XY.offset(2)):
        with Locations((-57.509574, 35.26069)):
            Circle(F12_R)
        with Locations((-57.509574, 35.26069)):
            Circle(F12_R_2, mode=Mode.SUBTRACT)
        with Locations((18.490426, 35.26069)):
            Circle(F12_R)
        with Locations((18.490426, 35.26069)):
            Circle(F12_R_2, mode=Mode.SUBTRACT)
        with Locations((18.490426, -8.73931)):
            Circle(F12_R)
        with Locations((18.490426, -8.73931)):
            Circle(F12_R_2, mode=Mode.SUBTRACT)
        with Locations((-57.509574, -8.73931)):
            Circle(F12_R)
        with Locations((-57.509574, -8.73931)):
            Circle(F12_R_2, mode=Mode.SUBTRACT)
        with Locations((-80.709574, -14.93931)):
            Circle(F12_R)
        with Locations((-80.709574, -14.93931)):
            Circle(F12_R_2, mode=Mode.SUBTRACT)
        with Locations((-80.709574, 41.46069)):
            Circle(F12_R)
        with Locations((-80.709574, 41.46069)):
            Circle(F12_R_2, mode=Mode.SUBTRACT)
        with Locations((35.690426, 41.46069)):
            Circle(F12_R)
        with Locations((35.690426, 41.46069)):
            Circle(F12_R_2, mode=Mode.SUBTRACT)
        with Locations((35.690426, -14.93931)):
            Circle(F12_R)
        with Locations((35.690426, -14.93931)):
            Circle(F12_R_2, mode=Mode.SUBTRACT)
    extrude(amount=F13_DEPTH)

    # F14
    f14_edges = [f1.edges().sort_by_distance(p)[0] for p in [
        (39.690426, 45.46069, 11.466667),
        (-84.709574, 45.46069, 11.466667),
        (-84.709574, -18.93931, 21),
        (39.690426, -18.93931, 21),
        (-84.709574, 13.26069, 2),
        (-22.509574, -18.93931, 2),
        (39.690426, 13.26069, 2),
        (-22.509574, 45.46069, 2),
    ]]
    fillet(f14_edges, radius=F14_R)


solid = f1.part
